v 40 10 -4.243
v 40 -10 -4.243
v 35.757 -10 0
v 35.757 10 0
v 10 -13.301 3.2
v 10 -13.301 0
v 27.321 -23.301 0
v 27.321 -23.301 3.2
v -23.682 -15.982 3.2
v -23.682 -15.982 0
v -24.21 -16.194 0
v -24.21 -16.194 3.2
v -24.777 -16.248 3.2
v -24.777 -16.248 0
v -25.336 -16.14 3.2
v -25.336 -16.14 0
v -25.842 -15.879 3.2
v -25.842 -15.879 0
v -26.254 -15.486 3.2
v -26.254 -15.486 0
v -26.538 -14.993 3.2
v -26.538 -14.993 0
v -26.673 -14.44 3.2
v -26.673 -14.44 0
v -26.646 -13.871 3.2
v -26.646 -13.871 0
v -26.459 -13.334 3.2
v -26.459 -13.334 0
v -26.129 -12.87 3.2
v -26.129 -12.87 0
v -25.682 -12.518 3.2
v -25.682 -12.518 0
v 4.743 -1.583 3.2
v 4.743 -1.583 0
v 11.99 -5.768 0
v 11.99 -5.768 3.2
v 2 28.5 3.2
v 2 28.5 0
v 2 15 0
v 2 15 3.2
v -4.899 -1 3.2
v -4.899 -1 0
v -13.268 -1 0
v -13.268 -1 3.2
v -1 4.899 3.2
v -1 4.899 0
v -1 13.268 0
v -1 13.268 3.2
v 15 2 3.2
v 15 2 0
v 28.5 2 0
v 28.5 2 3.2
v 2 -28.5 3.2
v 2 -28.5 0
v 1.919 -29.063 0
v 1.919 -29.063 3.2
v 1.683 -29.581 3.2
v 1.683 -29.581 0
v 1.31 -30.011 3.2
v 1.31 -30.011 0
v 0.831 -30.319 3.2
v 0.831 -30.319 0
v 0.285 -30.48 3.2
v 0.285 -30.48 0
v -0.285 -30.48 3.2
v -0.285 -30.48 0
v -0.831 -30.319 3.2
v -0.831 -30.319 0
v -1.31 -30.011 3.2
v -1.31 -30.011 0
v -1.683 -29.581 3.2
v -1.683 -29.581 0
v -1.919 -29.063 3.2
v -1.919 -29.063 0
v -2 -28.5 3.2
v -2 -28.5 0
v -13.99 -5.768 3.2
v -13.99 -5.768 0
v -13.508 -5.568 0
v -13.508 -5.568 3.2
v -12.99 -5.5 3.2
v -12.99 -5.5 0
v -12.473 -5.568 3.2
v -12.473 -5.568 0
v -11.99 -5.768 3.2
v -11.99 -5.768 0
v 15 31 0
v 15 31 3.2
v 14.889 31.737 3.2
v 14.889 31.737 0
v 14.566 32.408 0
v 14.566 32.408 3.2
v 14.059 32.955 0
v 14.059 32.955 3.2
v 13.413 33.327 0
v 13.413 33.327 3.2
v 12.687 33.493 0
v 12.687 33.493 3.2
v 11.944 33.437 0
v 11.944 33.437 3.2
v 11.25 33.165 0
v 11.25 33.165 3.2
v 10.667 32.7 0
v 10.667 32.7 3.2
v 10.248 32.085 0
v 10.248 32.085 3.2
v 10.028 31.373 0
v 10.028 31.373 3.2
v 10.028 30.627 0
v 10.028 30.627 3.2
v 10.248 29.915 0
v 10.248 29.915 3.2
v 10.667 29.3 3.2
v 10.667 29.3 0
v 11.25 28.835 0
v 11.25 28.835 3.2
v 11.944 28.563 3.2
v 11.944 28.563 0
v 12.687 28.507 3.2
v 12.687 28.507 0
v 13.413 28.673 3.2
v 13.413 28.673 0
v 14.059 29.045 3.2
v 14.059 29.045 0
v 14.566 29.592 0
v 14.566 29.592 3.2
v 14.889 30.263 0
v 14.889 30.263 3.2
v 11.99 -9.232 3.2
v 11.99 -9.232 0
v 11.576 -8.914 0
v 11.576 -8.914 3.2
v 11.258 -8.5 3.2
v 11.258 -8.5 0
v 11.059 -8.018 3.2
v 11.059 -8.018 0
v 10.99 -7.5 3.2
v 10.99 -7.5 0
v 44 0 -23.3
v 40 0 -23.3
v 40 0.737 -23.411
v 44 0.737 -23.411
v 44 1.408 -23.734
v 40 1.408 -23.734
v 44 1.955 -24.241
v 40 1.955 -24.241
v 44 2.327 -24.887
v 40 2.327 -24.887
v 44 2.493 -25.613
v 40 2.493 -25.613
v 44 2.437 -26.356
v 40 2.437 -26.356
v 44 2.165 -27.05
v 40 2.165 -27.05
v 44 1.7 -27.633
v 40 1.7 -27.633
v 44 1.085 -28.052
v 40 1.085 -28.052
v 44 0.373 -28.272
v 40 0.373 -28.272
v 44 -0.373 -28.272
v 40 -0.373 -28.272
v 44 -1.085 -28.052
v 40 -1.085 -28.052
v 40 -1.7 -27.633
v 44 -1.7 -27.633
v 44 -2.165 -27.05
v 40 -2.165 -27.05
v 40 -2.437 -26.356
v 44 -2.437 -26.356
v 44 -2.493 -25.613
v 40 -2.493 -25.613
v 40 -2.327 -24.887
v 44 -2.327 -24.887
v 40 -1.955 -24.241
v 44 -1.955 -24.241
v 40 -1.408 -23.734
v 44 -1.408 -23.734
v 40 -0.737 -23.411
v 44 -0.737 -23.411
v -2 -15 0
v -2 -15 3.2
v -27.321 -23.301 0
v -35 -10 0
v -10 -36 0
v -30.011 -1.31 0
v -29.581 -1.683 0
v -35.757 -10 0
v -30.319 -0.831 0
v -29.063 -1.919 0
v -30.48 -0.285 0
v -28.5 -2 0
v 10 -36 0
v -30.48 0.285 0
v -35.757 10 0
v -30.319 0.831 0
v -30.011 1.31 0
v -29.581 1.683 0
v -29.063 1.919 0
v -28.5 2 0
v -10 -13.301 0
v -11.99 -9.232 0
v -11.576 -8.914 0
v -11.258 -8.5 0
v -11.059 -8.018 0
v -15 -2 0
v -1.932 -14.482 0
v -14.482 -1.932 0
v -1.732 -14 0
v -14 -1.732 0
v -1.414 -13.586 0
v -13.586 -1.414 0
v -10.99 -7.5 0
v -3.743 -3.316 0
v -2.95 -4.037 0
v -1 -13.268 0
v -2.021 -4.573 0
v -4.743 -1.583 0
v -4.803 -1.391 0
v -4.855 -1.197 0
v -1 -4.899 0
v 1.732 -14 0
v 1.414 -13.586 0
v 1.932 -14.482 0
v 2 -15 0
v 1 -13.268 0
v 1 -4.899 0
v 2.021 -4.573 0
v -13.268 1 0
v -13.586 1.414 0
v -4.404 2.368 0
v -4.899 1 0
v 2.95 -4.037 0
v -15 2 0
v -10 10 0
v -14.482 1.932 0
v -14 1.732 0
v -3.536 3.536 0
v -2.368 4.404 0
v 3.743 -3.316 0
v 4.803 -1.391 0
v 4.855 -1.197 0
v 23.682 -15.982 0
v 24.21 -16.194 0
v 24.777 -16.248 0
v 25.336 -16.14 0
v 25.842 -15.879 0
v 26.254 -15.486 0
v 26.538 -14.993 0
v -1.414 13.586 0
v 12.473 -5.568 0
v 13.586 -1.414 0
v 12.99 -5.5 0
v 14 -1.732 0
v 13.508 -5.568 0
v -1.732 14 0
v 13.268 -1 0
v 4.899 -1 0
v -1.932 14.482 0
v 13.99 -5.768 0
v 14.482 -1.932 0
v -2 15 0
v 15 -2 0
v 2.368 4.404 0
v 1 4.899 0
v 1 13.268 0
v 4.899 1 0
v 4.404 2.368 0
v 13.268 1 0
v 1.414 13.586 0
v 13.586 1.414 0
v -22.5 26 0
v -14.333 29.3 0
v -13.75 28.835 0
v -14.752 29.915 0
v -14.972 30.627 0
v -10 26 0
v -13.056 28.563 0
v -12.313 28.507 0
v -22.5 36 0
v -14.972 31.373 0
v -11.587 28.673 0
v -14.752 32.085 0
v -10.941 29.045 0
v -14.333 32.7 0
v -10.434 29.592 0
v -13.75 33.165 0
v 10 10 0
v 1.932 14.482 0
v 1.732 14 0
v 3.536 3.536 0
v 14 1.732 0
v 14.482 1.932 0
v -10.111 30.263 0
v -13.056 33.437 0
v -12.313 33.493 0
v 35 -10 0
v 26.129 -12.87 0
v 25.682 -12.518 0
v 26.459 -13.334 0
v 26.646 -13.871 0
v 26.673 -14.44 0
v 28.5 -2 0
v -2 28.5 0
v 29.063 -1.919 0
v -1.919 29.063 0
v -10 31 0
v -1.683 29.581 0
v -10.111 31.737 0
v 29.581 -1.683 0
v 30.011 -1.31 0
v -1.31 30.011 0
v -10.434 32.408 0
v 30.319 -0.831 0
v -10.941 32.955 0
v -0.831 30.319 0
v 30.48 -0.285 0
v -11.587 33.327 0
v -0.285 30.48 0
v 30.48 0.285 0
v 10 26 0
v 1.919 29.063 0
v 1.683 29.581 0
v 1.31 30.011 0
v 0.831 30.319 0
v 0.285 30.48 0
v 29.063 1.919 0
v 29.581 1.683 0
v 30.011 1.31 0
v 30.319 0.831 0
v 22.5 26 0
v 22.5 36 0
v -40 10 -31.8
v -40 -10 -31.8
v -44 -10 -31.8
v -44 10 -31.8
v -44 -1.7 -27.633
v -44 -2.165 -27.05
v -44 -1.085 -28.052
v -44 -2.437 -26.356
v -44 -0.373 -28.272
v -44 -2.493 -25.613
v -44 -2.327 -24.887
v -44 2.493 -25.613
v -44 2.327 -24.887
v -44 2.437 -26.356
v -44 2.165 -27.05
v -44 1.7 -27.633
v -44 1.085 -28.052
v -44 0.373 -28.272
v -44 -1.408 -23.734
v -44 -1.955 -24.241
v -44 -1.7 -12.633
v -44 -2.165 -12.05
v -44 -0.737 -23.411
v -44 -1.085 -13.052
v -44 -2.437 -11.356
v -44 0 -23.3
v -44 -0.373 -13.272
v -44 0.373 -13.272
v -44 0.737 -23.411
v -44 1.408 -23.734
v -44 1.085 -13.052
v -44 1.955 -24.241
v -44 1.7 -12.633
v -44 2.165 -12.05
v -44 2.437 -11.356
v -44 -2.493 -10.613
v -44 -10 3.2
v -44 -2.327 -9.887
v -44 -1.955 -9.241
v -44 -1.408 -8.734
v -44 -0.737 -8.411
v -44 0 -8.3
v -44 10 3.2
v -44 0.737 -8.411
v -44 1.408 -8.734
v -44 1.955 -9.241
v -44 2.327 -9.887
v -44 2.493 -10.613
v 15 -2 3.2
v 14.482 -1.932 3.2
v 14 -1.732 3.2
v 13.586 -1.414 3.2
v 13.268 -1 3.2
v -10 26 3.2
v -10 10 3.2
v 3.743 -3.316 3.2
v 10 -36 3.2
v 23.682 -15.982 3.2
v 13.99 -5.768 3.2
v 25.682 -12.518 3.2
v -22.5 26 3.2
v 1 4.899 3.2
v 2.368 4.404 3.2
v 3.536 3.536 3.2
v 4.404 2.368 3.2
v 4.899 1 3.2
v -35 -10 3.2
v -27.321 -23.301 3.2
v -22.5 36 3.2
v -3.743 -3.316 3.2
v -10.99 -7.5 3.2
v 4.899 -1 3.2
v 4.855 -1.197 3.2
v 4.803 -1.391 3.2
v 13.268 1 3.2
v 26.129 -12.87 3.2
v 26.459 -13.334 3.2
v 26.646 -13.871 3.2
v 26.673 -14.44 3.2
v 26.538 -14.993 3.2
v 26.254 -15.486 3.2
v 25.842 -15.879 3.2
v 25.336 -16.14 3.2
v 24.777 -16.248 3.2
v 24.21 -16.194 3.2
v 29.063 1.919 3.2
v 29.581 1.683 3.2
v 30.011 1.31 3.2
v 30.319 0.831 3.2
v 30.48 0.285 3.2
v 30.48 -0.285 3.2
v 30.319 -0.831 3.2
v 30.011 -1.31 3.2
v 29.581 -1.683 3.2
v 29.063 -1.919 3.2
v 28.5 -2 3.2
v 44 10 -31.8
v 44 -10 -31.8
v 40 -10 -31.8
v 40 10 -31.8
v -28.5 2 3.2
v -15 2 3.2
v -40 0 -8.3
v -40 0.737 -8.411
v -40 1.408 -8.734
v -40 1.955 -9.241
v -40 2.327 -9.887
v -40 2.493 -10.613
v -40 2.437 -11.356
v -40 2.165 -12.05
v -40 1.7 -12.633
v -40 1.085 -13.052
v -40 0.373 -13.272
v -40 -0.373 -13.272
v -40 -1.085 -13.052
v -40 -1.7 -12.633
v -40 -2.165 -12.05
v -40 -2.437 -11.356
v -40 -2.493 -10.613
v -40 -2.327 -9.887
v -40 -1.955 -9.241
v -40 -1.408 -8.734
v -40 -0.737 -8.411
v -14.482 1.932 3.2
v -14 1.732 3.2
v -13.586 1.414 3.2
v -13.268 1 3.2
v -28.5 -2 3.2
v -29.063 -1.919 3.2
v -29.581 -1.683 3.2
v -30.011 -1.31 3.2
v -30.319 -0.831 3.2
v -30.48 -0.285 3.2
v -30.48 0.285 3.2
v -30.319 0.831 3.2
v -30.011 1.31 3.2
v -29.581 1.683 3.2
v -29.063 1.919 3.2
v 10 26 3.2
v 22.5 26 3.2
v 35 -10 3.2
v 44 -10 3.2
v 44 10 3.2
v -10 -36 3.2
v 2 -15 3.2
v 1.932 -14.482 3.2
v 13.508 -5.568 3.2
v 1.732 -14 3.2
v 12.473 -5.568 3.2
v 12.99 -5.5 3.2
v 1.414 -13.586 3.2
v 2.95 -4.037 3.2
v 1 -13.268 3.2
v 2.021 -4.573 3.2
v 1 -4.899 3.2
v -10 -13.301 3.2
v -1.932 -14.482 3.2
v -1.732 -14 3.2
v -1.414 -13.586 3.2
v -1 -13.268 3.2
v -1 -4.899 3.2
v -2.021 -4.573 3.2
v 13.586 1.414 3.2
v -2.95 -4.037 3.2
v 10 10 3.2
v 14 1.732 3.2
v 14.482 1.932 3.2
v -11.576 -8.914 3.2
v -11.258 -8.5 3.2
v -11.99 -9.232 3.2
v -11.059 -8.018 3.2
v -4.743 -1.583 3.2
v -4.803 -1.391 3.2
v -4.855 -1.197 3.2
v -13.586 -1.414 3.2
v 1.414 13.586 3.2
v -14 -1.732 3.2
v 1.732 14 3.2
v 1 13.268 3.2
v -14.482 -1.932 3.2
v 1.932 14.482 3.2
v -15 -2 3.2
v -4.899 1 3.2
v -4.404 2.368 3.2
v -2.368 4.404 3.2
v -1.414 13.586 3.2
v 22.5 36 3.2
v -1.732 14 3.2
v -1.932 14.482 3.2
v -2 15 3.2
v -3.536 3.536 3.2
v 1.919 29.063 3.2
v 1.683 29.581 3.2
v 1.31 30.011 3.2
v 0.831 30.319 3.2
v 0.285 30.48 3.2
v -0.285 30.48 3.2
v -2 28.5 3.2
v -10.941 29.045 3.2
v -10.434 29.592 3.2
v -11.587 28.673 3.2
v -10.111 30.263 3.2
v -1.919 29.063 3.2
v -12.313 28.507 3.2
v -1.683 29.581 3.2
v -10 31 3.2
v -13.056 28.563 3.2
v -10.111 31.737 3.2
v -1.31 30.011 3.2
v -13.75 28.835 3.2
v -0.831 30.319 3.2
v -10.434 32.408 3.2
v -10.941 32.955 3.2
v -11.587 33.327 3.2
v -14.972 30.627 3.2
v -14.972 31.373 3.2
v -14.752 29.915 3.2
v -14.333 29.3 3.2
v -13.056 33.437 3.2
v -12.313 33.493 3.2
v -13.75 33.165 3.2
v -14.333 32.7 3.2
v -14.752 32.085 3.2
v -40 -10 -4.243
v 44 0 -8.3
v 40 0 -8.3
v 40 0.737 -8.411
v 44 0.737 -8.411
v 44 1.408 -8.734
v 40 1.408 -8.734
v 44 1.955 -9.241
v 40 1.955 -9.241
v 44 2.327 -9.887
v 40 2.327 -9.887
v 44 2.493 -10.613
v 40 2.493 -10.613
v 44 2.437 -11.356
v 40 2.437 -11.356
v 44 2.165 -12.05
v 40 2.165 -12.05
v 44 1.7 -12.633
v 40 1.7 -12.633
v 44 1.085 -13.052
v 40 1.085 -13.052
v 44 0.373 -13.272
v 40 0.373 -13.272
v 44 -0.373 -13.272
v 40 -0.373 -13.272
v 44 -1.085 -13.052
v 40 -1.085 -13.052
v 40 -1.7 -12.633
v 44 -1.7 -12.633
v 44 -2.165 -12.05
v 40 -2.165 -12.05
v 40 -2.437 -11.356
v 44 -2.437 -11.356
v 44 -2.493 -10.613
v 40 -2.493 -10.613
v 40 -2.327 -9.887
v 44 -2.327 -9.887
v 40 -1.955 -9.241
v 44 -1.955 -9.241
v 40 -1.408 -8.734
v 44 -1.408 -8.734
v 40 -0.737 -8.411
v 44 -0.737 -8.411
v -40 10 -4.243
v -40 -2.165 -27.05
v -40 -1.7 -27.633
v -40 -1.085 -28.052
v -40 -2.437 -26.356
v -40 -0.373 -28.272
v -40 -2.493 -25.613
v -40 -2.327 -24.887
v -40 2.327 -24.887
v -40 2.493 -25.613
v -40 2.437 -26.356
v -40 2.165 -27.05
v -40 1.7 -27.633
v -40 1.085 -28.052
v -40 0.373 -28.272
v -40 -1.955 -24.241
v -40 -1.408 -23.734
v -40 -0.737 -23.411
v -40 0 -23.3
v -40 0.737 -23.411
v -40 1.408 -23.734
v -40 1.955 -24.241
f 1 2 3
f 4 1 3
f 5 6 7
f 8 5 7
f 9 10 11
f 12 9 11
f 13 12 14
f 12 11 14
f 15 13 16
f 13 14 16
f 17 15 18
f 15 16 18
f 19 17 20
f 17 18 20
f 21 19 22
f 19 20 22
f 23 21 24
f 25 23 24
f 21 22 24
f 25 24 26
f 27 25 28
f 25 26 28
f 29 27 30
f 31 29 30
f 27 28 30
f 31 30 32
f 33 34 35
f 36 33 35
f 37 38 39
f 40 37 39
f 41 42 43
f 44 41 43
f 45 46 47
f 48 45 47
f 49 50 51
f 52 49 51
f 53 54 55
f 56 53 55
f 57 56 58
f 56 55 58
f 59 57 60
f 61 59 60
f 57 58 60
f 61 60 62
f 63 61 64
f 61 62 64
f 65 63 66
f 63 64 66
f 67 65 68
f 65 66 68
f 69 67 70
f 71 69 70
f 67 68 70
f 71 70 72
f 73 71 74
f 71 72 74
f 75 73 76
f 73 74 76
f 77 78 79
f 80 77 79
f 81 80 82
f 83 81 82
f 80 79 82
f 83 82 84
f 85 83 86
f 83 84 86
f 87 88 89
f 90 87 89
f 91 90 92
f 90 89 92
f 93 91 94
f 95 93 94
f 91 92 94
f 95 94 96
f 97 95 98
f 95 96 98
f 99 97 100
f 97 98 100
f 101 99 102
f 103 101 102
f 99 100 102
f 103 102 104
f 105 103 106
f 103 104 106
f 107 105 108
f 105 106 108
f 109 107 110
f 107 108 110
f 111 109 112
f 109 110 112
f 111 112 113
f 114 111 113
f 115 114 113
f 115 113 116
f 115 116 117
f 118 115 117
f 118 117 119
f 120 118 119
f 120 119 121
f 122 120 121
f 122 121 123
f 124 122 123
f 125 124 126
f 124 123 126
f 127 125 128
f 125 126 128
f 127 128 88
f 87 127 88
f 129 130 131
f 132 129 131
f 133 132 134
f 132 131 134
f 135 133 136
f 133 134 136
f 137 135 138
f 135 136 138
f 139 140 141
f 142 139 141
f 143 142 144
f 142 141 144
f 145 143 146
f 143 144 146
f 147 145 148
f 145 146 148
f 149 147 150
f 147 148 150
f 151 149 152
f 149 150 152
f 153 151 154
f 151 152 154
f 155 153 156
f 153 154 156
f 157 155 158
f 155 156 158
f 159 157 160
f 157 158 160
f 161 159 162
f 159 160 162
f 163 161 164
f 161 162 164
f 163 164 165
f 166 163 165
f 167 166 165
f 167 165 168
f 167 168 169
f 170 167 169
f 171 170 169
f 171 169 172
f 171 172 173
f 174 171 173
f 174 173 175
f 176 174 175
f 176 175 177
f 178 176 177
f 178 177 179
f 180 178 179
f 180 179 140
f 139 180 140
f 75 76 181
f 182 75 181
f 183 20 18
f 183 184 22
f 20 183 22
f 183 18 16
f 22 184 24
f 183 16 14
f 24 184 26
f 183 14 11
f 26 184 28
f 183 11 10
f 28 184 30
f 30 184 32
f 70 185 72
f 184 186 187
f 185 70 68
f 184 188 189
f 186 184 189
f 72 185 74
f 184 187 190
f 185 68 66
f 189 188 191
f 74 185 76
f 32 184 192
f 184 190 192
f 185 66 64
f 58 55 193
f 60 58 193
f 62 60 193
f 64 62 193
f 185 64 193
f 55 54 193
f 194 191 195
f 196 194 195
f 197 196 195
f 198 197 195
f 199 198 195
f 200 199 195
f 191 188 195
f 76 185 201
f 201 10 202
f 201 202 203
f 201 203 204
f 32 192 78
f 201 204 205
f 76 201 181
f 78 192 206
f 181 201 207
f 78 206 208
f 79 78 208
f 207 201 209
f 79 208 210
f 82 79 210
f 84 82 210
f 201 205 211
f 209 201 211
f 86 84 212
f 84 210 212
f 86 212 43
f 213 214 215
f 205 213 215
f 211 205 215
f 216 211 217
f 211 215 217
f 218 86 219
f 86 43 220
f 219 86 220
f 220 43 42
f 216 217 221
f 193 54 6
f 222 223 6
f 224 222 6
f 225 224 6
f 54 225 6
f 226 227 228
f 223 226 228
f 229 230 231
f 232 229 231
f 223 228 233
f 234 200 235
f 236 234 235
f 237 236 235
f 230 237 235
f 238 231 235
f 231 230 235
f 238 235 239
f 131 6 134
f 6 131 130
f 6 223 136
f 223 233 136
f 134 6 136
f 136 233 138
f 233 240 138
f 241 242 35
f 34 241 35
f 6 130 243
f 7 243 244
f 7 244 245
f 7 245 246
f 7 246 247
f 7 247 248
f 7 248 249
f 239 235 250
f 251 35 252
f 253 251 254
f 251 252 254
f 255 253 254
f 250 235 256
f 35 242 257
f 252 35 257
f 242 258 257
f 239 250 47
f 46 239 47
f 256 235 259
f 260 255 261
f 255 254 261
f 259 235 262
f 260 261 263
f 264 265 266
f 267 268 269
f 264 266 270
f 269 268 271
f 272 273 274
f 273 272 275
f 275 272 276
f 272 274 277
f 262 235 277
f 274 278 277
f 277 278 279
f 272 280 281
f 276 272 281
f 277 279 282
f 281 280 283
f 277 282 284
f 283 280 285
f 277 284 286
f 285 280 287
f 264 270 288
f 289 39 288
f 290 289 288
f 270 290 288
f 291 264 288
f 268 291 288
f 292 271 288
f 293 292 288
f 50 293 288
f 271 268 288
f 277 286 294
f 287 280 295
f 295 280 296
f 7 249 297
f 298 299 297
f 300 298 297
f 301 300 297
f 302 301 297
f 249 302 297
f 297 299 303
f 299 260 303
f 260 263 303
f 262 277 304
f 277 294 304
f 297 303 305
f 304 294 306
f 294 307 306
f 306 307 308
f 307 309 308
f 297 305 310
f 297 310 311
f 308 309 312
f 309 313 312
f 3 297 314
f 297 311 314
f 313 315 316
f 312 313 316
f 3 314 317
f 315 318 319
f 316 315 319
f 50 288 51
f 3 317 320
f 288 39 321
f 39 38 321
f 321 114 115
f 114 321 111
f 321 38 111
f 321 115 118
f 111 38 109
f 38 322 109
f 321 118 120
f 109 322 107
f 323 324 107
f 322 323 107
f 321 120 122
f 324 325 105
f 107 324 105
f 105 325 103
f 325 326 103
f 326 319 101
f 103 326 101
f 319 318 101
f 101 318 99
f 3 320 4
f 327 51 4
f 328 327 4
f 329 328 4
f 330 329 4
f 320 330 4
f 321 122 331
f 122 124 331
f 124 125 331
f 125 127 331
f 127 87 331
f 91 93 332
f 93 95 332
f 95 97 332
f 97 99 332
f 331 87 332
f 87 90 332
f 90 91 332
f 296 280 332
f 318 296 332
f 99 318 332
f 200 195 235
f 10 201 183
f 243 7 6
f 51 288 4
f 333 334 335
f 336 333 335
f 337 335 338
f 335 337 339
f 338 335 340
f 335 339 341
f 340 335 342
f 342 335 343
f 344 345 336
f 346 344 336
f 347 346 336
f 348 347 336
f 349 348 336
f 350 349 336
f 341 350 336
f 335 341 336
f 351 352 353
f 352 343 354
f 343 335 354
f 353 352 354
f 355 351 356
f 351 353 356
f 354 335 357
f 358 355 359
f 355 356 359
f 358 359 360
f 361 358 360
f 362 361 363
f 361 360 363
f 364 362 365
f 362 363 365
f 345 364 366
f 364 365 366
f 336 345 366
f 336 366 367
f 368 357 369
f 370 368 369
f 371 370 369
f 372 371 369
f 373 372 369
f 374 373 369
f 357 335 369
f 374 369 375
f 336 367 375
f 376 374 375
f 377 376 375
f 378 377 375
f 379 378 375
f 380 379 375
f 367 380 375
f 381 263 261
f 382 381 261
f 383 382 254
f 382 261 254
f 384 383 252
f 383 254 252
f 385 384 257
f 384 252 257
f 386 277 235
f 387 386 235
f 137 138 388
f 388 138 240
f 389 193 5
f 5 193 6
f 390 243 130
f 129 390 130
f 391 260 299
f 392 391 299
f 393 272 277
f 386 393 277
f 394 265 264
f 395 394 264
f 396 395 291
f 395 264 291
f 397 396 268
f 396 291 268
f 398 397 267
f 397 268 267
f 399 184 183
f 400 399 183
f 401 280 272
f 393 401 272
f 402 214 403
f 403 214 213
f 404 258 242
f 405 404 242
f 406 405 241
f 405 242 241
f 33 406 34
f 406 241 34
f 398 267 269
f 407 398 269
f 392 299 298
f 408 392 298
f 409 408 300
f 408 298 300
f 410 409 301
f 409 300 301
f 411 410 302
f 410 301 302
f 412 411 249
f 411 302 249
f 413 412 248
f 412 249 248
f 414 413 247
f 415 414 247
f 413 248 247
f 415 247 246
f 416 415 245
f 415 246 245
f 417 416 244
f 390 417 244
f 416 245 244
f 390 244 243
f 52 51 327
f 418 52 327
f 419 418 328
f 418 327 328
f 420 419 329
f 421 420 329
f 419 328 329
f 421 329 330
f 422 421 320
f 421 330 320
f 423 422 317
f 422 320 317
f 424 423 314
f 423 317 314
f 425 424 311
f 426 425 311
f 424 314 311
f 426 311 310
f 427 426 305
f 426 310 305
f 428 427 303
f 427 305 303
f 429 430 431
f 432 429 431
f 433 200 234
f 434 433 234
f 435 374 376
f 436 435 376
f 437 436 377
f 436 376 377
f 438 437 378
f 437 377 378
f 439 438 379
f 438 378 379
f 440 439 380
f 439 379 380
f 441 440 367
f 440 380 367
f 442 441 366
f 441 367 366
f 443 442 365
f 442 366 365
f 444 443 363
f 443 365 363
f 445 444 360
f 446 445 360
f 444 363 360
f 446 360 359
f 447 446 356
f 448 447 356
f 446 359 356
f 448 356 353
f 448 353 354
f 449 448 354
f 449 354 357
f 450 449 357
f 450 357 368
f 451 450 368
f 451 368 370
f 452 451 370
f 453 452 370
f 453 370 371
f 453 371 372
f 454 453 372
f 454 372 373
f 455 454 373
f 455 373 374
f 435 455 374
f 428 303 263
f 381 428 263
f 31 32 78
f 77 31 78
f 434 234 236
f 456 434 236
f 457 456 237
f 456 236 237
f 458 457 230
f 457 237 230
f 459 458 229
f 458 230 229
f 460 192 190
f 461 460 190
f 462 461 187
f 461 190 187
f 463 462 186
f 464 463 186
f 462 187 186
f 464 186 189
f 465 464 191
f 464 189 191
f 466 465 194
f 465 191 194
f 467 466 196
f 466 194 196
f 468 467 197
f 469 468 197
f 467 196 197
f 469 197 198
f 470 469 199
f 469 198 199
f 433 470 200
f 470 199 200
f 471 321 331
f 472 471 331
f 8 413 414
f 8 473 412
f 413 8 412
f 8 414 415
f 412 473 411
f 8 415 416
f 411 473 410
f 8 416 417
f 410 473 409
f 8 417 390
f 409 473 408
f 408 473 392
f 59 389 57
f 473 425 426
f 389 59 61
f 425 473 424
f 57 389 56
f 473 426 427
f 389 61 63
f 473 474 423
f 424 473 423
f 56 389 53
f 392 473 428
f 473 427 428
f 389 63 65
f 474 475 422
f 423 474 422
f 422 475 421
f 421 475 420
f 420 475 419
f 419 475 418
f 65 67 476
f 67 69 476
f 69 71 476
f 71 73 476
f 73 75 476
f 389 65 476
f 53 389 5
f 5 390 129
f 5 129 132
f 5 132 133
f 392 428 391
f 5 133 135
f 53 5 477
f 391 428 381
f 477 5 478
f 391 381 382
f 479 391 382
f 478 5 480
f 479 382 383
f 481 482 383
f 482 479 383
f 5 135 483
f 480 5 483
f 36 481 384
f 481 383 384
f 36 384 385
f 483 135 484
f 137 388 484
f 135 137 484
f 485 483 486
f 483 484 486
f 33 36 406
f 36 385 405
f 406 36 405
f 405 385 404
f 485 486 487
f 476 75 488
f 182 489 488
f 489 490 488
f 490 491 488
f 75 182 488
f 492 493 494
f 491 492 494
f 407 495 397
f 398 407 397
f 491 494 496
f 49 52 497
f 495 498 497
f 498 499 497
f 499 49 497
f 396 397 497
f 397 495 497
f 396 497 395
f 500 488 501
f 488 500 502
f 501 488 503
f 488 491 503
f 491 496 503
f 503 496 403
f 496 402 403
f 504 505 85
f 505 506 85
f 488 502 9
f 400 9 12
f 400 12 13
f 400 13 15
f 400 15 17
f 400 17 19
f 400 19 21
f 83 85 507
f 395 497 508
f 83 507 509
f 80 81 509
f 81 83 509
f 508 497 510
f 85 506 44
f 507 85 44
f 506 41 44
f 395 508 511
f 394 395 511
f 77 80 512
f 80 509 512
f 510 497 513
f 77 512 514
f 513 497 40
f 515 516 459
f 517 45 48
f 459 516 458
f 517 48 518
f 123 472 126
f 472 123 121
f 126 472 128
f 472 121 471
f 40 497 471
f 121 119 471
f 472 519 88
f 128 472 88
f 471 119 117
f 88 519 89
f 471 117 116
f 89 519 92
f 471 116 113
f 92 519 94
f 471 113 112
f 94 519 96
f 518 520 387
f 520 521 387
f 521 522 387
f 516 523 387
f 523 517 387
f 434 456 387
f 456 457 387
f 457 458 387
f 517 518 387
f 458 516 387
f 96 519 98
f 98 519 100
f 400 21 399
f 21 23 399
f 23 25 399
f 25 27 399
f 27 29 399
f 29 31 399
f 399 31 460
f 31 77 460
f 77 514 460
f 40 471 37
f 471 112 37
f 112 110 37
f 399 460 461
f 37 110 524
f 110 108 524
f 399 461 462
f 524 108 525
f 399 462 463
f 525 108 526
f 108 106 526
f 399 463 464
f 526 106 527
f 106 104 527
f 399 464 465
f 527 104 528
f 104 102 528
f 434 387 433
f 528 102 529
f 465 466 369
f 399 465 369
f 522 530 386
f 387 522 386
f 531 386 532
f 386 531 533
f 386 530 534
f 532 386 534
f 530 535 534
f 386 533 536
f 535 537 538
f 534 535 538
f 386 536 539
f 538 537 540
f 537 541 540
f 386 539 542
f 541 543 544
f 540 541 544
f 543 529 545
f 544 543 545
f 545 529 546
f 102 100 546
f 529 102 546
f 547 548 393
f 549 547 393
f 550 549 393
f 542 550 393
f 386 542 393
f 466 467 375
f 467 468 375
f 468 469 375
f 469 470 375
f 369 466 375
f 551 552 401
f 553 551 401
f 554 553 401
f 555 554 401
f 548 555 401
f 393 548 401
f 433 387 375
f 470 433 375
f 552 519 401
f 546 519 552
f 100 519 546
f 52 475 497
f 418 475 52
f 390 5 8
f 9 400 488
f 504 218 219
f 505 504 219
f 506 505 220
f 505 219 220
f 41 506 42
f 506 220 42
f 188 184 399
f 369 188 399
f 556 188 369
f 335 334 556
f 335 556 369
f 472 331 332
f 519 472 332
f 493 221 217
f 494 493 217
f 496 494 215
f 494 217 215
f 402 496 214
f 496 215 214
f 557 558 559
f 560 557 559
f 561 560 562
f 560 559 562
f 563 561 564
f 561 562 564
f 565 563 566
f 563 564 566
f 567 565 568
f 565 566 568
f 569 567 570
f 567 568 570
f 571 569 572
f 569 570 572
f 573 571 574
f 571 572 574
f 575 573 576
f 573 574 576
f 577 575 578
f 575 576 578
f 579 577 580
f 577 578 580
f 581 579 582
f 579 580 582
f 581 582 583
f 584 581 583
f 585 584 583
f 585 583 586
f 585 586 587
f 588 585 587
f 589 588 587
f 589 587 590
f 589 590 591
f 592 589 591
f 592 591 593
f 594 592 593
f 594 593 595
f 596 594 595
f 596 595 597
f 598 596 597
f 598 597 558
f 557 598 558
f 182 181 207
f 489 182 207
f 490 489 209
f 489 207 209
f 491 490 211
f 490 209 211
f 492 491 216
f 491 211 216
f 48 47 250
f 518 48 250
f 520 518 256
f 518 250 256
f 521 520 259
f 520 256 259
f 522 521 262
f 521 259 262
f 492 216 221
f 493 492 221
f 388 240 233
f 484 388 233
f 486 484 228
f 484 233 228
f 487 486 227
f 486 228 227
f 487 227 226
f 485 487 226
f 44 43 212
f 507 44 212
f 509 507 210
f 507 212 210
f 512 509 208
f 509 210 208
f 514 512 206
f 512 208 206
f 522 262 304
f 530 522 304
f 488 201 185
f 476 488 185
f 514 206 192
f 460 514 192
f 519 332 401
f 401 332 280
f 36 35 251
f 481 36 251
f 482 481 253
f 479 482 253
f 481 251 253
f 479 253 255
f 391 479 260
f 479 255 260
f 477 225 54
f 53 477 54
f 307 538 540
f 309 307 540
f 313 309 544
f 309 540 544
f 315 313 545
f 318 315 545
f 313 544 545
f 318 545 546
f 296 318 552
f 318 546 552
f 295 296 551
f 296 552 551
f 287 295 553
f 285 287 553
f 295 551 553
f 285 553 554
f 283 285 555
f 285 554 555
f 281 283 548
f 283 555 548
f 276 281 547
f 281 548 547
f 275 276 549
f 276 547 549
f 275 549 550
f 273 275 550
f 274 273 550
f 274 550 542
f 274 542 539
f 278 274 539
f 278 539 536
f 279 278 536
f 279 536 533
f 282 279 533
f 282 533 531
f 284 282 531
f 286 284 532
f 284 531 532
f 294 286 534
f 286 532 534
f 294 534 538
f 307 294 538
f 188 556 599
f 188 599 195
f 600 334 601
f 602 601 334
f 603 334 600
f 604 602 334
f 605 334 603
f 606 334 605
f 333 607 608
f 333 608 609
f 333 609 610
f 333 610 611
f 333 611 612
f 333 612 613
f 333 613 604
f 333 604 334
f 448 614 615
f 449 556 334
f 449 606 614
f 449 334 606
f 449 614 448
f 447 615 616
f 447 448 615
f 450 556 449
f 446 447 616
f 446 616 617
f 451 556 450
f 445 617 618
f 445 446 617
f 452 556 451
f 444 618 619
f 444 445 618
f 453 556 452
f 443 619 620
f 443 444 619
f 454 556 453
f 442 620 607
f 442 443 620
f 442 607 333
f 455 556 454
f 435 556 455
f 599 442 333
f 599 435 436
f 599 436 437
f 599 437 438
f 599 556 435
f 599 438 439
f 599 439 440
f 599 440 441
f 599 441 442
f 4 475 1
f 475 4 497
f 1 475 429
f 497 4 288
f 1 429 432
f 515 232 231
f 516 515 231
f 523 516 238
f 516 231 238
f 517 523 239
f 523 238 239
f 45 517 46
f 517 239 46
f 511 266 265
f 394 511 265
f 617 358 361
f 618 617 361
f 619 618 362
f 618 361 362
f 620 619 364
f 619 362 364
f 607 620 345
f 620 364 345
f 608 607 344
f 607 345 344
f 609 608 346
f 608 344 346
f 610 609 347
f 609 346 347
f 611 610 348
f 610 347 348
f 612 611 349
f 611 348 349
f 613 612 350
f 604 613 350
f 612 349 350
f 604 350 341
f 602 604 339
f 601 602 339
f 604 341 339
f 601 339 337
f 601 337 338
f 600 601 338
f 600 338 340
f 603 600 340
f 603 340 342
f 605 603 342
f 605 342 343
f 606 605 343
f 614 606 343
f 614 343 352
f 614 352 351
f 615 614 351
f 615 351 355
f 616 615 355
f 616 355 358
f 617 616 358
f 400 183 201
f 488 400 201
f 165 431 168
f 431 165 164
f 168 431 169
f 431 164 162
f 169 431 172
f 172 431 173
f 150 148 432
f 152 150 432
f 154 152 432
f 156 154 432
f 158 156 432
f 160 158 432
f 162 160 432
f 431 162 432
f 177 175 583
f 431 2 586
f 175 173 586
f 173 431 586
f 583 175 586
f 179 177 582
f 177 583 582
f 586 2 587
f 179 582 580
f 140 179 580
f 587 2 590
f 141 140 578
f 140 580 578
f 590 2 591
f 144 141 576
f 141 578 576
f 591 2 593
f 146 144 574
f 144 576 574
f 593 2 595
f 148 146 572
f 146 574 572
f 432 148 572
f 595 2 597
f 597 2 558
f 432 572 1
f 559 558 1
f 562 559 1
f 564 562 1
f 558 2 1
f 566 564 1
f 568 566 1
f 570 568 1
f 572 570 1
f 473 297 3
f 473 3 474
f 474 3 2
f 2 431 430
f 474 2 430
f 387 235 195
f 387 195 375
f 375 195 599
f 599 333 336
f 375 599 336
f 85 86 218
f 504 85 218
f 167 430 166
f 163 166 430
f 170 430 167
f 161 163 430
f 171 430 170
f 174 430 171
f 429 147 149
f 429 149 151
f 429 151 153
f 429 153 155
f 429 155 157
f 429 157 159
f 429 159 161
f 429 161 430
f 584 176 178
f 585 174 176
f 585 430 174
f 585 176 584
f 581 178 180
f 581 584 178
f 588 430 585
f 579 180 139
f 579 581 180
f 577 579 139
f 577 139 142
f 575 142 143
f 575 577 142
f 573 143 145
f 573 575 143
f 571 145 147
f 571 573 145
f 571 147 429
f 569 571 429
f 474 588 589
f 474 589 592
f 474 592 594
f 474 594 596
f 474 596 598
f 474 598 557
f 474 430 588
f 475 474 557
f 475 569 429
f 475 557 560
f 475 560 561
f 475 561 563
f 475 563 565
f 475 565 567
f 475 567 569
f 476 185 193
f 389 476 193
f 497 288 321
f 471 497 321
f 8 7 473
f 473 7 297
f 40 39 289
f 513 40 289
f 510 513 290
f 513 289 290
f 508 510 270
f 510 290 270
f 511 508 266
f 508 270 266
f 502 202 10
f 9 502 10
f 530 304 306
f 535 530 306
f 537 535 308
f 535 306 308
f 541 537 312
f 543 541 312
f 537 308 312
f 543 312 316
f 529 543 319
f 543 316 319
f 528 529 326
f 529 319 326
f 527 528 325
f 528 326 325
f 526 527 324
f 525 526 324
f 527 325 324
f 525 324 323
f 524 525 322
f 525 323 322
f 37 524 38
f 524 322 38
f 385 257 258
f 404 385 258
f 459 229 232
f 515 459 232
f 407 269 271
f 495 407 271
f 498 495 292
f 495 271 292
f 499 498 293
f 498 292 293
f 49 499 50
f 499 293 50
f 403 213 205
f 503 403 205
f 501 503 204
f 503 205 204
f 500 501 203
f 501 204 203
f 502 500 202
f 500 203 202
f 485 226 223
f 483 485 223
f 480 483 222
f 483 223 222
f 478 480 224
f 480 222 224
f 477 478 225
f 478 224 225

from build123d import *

# Parameters (mm, degrees)
BOSS_EXTRUDE1_DEPTH = 3.2
SKETCH2_W           = 4
SKETCH2_H           = 20
BOSS_EXTRUDE2_DEPTH = 35
BOSS_EXTRUDE3_DEPTH = 20
CUT_EXTRUDE1_REACH  = 102.256
SKETCH4_R           = 2.5
SKETCH5_R           = 2.5
CUT_EXTRUDE2_DEPTH  = 3.2


with BuildPart() as part:
    # Sketch1 → Boss-Extrude1 (new body)
    with BuildSketch(Plane.XY):
        Polygon((22.5, 36), (-22.5, 36), (-22.5, 26), (-10, 26), (-10, 10), (-40, 10), (-40, -10), (-35, -10), (-27.320508076, -23.301270189), (-10, -13.301270189), (-10, -36), (10, -36), (10, -13.301270189), (27.320508076, -23.301270189), (35, -10), (40, -10), (40, 10), (10, 10), (10, 26), (22.5, 26), align=None)
        with BuildLine():
            Line((2, 28.5), (2, 15))
            ThreePointArc((2, 15), (1.732050808, 14), (1, 13.267949192))
            Line((1, 13.267949192), (1, 4.898979486))
            ThreePointArc((1, 4.898979486), (3.535533906, 3.535533906), (4.898979486, 1))
            Line((4.898979486, 1), (13.267949192, 1))
            ThreePointArc((13.267949192, 1), (14, 1.732050808), (15, 2))
            Line((15, 2), (28.5, 2))
            ThreePointArc((28.5, 2), (30.5, 0), (28.5, -2))
            Line((28.5, -2), (15, -2))
            ThreePointArc((15, -2), (14, -1.732050808), (13.267949192, -1))
            Line((13.267949192, -1), (4.898979486, -1))
            ThreePointArc((4.898979486, -1), (4.829629131, -1.294095226), (4.742640687, -1.583464339))
            Line((4.742640687, -1.583464339), (11.990381057, -5.767949192))
            ThreePointArc((11.990381057, -5.767949192), (12.990381057, -5.5), (13.990381057, -5.767949192))
            Line((13.990381057, -5.767949192), (25.681724008, -12.517949192))
            ThreePointArc((25.681724008, -12.517949192), (26.413774815, -15.25), (23.681724008, -15.982050808))
            Line((23.681724008, -15.982050808), (11.990381057, -9.232050808))
            ThreePointArc((11.990381057, -9.232050808), (11.258330249, -8.5), (10.990381057, -7.5))
            Line((10.990381057, -7.5), (3.742640687, -3.315515147))
            ThreePointArc((3.742640687, -3.315515147), (2.5, -4.330127019), (1, -4.898979486))
            Line((1, -4.898979486), (1, -13.267949192))
            ThreePointArc((1, -13.267949192), (1.732050808, -14), (2, -15))
            Line((2, -15), (2, -28.5))
            ThreePointArc((2, -28.5), (0, -30.5), (-2, -28.5))
            Line((-2, -28.5), (-2, -15))
            ThreePointArc((-2, -15), (-1.732050808, -14), (-1, -13.267949192))
            Line((-1, -13.267949192), (-1, -4.898979486))
            ThreePointArc((-1, -4.898979486), (-2.5, -4.330127019), (-3.742640687, -3.315515147))
            Line((-3.742640687, -3.315515147), (-10.990381057, -7.5))
            ThreePointArc((-10.990381057, -7.5), (-11.258330249, -8.5), (-11.990381057, -9.232050808))
            Line((-11.990381057, -9.232050808), (-23.681724008, -15.982050808))
            ThreePointArc((-23.681724008, -15.982050808), (-26.413774815, -15.25), (-25.681724008, -12.517949192))
            Line((-25.681724008, -12.517949192), (-13.990381057, -5.767949192))
            ThreePointArc((-13.990381057, -5.767949192), (-12.990381057, -5.5), (-11.990381057, -5.767949192))
            Line((-11.990381057, -5.767949192), (-4.742640687, -1.583464339))
            ThreePointArc((-4.742640687, -1.583464339), (-4.829629131, -1.294095226), (-4.898979486, -1))
            Line((-4.898979486, -1), (-13.267949192, -1))
            ThreePointArc((-13.267949192, -1), (-14, -1.732050808), (-15, -2))
            Line((-15, -2), (-28.5, -2))
            ThreePointArc((-28.5, -2), (-30.5, 0), (-28.5, 2))
            Line((-28.5, 2), (-15, 2))
            ThreePointArc((-15, 2), (-14, 1.732050808), (-13.267949192, 1))
            Line((-13.267949192, 1), (-4.898979486, 1))
            ThreePointArc((-4.898979486, 1), (-3.535533906, 3.535533906), (-1, 4.898979486))
            Line((-1, 4.898979486), (-1, 13.267949192))
            ThreePointArc((-1, 13.267949192), (-1.732050808, 14), (-2, 15))
            Line((-2, 15), (-2, 28.5))
            ThreePointArc((-2, 28.5), (0, 30.5), (2, 28.5))
        make_face(mode=Mode.SUBTRACT)
    extrude(amount=BOSS_EXTRUDE1_DEPTH)

    # Sketch2 → Boss-Extrude2 (add)
    with BuildSketch(Plane(origin=(0, 0, 3.2), x_dir=(-1, 0, 0), z_dir=(0, 0, -1))):
        with Locations((42, 0)):
            Rectangle(SKETCH2_W, SKETCH2_H)
        with Locations((-42, 0)):
            Rectangle(SKETCH2_W, SKETCH2_H)
    extrude(amount=BOSS_EXTRUDE2_DEPTH)

    # Sketch3 → Boss-Extrude3 (add)
    with BuildSketch(Plane(origin=(0, 10, 0), x_dir=(1, 0, 0), z_dir=(0, 1, 0))):
        Polygon((-40, 4.242640687), (-35.757359313, 0), (-40, 0), align=None)
        Polygon((35.757359313, 0), (40, 0), (40, 4.242640687), align=None)
    extrude(amount=-BOSS_EXTRUDE3_DEPTH)

    # Cut-Extrude1: up to this face of the body (flat: up to its plane)
    cut_extrude1_end = Plane(part.part.faces().sort_by_distance((44, 0, -14.3))[0])
    # Sketch4 → Cut-Extrude1 (cut, up to the picked face)
    with BuildSketch(Plane.ZY.offset(44), mode=Mode.PRIVATE) as cut_extrude1_sk1:
        with Locations((-25.8, 0)):
            Circle(SKETCH4_R)
    cut_extrude1_tool1 = split(extrude(cut_extrude1_sk1.sketch, amount=-CUT_EXTRUDE1_REACH, mode=Mode.PRIVATE), bisect_by=cut_extrude1_end, keep=Keep.BOTH, mode=Mode.PRIVATE)
    # Sketch4 → Cut-Extrude1 (cut, up to the picked face)
    with BuildSketch(Plane.ZY.offset(44), mode=Mode.PRIVATE) as cut_extrude1_sk2:
        with Locations((-10.8, 0)):
            Circle(SKETCH4_R)
    cut_extrude1_tool2 = split(extrude(cut_extrude1_sk2.sketch, amount=-CUT_EXTRUDE1_REACH, mode=Mode.PRIVATE), bisect_by=cut_extrude1_end, keep=Keep.BOTH, mode=Mode.PRIVATE)
    add(cut_extrude1_tool1.solids().sort_by(Axis((-44, 0, -25.8), (1, 0, 0)))[0], mode=Mode.SUBTRACT)
    add(cut_extrude1_tool2.solids().sort_by(Axis((-44, 0, -10.8), (1, 0, 0)))[0], mode=Mode.SUBTRACT)

    # Sketch5 → Cut-Extrude2 (cut)
    with BuildSketch(Plane.XY.offset(3.2)):
        with Locations((-12.5, 31)):
            Circle(SKETCH5_R)
        with Locations((12.5, 31)):
            Circle(SKETCH5_R)
    extrude(amount=-CUT_EXTRUDE2_DEPTH, mode=Mode.SUBTRACT)


solid = part.part
